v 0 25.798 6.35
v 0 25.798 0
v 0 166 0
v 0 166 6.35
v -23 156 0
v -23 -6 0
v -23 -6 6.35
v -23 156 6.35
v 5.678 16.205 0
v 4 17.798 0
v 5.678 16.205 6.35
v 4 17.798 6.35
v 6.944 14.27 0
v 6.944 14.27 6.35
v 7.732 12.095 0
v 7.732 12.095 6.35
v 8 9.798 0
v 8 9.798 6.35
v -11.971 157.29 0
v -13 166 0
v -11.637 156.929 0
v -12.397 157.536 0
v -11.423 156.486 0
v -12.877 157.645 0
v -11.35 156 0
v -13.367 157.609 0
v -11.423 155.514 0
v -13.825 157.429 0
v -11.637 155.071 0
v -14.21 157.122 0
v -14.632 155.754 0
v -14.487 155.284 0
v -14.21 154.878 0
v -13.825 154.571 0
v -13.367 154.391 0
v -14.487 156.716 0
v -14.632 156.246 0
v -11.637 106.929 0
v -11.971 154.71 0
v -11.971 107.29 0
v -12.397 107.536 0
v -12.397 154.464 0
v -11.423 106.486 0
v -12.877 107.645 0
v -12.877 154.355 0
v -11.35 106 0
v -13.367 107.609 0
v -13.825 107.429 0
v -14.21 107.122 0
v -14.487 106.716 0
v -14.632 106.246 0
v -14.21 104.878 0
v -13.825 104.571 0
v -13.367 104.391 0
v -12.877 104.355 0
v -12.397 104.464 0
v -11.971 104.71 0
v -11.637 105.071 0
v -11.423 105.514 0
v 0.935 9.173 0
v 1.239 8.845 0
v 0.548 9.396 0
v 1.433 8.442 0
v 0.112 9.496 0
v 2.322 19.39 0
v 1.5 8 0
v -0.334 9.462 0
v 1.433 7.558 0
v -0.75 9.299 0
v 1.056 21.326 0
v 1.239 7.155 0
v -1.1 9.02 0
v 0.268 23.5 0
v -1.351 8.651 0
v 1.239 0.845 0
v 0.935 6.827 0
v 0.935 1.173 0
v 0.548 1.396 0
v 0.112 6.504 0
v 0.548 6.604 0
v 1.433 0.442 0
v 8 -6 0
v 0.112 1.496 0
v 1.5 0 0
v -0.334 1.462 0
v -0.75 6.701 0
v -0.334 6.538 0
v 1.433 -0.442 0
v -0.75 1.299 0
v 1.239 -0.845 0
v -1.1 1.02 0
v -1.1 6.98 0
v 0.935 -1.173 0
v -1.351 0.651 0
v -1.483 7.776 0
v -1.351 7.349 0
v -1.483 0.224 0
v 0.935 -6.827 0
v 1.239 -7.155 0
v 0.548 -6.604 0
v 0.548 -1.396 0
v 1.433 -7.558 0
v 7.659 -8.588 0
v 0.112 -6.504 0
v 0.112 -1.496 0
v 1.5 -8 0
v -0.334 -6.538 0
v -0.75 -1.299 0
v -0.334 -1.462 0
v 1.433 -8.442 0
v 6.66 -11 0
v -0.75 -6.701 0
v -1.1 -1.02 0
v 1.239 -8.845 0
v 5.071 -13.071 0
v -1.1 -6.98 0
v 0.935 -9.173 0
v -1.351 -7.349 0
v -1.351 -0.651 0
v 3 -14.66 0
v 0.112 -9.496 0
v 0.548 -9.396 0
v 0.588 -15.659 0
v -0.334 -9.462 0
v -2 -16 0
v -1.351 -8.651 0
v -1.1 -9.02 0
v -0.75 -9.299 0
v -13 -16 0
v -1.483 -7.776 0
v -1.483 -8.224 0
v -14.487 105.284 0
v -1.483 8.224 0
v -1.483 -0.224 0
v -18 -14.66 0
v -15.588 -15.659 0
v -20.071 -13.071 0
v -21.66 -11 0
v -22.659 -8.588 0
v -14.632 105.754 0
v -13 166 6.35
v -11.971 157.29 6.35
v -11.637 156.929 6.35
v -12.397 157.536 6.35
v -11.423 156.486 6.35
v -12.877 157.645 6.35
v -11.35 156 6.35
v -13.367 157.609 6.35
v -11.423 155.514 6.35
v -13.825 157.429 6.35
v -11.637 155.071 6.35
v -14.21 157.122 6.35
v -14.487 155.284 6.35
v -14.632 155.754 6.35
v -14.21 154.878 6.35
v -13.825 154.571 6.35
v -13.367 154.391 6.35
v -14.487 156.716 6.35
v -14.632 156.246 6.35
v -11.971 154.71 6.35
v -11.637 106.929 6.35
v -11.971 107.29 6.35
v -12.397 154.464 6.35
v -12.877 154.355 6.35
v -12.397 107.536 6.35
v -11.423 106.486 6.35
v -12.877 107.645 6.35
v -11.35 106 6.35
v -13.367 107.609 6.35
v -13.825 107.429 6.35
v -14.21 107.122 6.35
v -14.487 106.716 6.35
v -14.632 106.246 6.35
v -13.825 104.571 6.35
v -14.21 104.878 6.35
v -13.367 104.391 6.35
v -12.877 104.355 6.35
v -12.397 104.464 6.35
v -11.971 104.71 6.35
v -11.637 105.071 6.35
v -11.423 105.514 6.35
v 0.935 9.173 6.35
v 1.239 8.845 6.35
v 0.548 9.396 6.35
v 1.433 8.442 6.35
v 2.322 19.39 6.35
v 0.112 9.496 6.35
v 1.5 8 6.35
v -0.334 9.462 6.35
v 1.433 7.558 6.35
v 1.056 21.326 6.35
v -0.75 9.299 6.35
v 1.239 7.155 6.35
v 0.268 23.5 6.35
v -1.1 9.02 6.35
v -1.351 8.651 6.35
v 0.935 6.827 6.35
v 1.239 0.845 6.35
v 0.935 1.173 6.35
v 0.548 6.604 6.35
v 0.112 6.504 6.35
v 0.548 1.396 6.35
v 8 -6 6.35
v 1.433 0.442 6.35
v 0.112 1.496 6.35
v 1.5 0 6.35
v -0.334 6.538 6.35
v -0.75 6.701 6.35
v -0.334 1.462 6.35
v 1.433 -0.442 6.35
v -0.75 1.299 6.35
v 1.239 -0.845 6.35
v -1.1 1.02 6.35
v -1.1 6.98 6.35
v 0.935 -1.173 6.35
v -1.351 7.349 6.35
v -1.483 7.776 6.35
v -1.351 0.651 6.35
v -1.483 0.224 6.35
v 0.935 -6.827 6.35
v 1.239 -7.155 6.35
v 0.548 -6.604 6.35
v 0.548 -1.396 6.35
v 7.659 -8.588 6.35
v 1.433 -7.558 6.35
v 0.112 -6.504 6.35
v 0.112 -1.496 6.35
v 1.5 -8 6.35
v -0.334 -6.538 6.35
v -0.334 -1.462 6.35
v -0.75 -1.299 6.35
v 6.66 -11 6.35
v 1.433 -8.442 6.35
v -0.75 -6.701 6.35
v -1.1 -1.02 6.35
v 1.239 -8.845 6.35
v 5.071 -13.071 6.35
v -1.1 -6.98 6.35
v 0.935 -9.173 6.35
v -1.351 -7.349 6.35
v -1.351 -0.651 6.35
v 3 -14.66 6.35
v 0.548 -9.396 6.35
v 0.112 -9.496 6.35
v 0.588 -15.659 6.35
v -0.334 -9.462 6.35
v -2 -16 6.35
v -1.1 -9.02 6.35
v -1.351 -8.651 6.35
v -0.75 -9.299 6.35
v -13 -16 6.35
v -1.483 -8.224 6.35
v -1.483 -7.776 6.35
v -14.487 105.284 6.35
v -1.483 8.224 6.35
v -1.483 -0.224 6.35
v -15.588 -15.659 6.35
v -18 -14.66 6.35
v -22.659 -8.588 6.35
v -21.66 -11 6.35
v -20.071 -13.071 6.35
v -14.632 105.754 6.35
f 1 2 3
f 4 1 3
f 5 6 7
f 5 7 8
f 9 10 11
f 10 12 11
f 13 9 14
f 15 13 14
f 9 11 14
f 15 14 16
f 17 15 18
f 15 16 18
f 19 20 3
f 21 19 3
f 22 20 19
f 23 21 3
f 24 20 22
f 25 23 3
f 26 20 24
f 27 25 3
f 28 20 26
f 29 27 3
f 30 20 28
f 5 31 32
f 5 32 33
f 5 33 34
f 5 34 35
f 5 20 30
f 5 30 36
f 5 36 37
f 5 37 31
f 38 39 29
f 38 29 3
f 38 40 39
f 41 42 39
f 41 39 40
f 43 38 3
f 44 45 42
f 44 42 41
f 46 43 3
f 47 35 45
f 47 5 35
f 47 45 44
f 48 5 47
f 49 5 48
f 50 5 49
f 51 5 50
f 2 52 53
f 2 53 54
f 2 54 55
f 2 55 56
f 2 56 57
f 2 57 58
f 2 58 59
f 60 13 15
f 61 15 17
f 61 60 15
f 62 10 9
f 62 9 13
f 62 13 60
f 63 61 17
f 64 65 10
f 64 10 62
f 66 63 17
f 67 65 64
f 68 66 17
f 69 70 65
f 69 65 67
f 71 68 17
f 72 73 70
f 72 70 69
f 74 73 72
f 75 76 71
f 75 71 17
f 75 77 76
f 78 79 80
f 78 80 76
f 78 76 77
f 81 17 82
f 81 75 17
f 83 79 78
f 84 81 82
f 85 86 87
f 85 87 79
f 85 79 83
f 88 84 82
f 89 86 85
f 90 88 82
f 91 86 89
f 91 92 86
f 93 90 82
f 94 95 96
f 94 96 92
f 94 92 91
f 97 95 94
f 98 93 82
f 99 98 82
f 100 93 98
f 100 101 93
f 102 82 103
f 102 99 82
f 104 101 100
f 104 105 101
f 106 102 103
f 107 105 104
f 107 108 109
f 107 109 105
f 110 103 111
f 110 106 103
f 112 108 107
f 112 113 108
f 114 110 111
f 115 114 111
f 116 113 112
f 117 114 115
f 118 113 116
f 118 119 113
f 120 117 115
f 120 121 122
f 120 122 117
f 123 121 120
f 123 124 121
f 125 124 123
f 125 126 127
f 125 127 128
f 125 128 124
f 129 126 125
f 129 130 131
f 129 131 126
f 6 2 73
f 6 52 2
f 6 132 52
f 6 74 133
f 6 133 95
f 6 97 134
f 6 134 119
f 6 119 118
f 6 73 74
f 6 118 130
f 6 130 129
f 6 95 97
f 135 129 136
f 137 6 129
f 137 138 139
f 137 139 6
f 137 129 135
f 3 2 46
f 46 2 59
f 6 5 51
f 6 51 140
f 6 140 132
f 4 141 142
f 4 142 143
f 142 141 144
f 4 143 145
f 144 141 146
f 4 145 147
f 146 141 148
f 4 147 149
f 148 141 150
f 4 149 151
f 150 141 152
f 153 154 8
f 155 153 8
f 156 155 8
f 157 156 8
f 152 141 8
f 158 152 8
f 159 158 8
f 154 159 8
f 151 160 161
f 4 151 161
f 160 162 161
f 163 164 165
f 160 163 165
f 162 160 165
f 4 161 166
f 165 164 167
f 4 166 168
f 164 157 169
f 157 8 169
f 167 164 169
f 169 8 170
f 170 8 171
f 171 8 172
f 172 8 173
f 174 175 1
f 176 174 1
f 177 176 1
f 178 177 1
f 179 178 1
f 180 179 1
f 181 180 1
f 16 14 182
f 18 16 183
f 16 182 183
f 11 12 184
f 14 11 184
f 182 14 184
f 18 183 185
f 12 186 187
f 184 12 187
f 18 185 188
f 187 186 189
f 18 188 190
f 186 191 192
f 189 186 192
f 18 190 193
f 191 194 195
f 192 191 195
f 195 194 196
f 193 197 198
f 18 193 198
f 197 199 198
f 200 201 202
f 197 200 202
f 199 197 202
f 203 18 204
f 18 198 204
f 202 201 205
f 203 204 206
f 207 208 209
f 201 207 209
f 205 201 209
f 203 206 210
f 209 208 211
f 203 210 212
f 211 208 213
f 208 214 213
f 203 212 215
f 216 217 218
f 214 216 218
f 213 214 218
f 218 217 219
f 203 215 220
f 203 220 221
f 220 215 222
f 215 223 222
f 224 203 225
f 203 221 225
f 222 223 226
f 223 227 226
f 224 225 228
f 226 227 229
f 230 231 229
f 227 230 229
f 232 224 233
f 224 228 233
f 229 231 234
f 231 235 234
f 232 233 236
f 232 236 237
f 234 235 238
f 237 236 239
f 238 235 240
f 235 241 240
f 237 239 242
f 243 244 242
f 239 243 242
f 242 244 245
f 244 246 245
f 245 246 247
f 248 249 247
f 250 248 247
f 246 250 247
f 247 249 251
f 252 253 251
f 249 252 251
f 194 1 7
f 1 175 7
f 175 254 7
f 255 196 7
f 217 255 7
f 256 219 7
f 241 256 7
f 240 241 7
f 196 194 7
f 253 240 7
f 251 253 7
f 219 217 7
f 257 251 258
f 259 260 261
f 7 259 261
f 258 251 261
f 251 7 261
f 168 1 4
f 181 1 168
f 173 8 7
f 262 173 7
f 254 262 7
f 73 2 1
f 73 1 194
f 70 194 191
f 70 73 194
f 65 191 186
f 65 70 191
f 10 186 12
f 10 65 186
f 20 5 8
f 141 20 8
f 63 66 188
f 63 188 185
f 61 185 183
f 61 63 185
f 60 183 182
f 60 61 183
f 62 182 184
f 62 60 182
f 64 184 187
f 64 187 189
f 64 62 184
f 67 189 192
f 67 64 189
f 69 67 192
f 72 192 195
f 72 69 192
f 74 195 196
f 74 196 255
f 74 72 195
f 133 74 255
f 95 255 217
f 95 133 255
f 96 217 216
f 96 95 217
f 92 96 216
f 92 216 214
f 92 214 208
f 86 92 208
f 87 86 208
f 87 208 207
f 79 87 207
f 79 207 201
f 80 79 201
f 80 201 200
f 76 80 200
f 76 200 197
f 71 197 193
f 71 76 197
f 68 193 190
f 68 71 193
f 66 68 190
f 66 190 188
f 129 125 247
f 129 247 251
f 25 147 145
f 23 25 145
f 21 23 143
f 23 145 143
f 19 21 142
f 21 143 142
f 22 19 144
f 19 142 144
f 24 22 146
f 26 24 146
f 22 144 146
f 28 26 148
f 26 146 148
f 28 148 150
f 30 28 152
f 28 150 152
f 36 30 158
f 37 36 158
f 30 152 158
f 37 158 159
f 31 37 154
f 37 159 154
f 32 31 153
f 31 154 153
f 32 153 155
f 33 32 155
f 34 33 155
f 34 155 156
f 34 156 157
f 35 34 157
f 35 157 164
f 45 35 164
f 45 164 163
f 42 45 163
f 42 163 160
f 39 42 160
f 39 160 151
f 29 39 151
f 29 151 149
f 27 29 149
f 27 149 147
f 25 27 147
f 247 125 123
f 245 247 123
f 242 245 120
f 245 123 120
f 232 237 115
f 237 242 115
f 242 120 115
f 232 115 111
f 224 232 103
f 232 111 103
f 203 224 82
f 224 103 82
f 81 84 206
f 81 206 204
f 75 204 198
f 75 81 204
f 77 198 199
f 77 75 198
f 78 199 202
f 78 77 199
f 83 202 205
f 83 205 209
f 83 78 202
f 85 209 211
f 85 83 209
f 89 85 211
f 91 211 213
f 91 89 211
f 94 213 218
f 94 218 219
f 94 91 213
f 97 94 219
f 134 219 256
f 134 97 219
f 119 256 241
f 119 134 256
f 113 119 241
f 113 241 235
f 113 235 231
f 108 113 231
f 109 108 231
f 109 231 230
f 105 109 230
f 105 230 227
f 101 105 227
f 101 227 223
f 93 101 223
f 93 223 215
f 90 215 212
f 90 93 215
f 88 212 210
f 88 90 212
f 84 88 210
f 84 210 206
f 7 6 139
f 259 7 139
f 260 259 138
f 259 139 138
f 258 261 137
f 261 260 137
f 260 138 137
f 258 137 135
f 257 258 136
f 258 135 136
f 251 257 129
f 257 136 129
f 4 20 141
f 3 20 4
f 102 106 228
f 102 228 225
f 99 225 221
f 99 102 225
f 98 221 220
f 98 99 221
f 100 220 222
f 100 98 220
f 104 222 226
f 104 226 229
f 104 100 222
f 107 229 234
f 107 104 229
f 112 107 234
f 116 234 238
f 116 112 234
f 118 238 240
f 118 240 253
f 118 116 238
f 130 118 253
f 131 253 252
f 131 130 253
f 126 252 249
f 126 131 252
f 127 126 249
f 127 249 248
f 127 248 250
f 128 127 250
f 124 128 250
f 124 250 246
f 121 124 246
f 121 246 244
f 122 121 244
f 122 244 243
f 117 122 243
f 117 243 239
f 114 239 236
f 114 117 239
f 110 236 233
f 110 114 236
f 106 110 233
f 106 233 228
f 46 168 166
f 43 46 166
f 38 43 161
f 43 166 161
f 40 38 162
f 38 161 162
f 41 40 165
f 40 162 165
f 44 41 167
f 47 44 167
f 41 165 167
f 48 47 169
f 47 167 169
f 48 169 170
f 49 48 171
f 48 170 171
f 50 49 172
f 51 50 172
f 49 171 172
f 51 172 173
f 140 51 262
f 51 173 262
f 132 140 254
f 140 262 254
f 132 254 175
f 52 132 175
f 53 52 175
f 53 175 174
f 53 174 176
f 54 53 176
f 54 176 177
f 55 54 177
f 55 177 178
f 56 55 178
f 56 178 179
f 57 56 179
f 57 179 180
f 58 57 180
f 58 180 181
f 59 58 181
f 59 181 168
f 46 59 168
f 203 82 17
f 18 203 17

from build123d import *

# Parameters (mm, degrees)
SKETCH1_W           = 16
SKETCH1_H           = 32
SKETCH1_R           = 1.5
SKETCH1_W_2         = 8
SKETCH1_H_2         = 150
BOSS_EXTRUDE1_DEPTH = 6.35
FILLET1_R           = 10
FILLET2_R           = 10
CHAMFER1_SIZE       = 10
SKETCH2_R           = 1.65
CUT_EXTRUDE1_DEPTH  = 10


with BuildPart() as part:
    # Sketch1 → Boss-Extrude1 (new body)
    # profile 1 of 3: a face of its own
    with BuildSketch(Plane.XY):
        Rectangle(SKETCH1_W, SKETCH1_H)
        with Locations((0, -8)):
            Circle(SKETCH1_R, mode=Mode.SUBTRACT)
        with Locations((0, 8)):
            Circle(SKETCH1_R, mode=Mode.SUBTRACT)
        Circle(SKETCH1_R, mode=Mode.SUBTRACT)
    # profile 2 of 3: a face of its own
    with BuildSketch(Plane.XY):
        with Locations((-4, 91)):
            Rectangle(SKETCH1_W_2, SKETCH1_H_2)
    # profile 3 of 3: a face of its own
    with BuildSketch(Plane.XY):
        Polygon((-23, -16), (-23, 166), (-8, 166), (-8, 16), (-8, -16), align=None)
    extrude(amount=BOSS_EXTRUDE1_DEPTH)

    # Fillet1
    # the kernel refuses this fillet: 10 mm, written as the material it adds along each edge
    with BuildSketch(Plane(origin=(0, 16, 0), x_dir=(0, 1, 0), z_dir=(0, 0, 1))) as fillet1_piece_1:
        with BuildLine():
            CenterArc((9.797958971, -10), FILLET1_R, 90, 78.463040967)
            Line((0, -8), (0, 0))
            Line((0, 0), (9.797958971, 0))
        make_face()
    extrude(amount=6.35)
    # the kernel refuses this fillet: 10 mm, written as the material it takes off along each edge
    with BuildSketch(Plane(origin=(8, -16, -25), x_dir=(0, 1, 0), z_dir=(0, 0, 1)), Plane(origin=(-23, -16, -25), x_dir=(1, 0, 0), z_dir=(0, 0, 1))) as fillet1_2_piece_1:
        with BuildLine():
            CenterArc((FILLET1_R, FILLET1_R), FILLET1_R, 180, 90)
            Line((0, FILLET1_R), (0, 0))
            Line((0, 0), (FILLET1_R, 0))
        make_face()
    extrude(amount=56.35, mode=Mode.SUBTRACT)

    # Fillet2
    fillet2_edges = [part.edges().sort_by_distance(p)[0] for p in [
        (8, 16, 3.175),
    ]]
    fillet(fillet2_edges, radius=FILLET2_R)

    # Chamfer1
    chamfer1_edges = [part.edges().sort_by_distance(p)[0] for p in [
        (-23, 166, 3.175),
    ]]
    chamfer(chamfer1_edges, length=CHAMFER1_SIZE)

    # Sketch2 → Cut-Extrude1 (cut)
    with BuildSketch(Plane.XY.offset(6.35)):
        with Locations((-13, 156)):
            Circle(SKETCH2_R)
        with Locations((-13, 106)):
            Circle(SKETCH2_R)
    extrude(amount=-CUT_EXTRUDE1_DEPTH, mode=Mode.SUBTRACT)


solid = part.part
